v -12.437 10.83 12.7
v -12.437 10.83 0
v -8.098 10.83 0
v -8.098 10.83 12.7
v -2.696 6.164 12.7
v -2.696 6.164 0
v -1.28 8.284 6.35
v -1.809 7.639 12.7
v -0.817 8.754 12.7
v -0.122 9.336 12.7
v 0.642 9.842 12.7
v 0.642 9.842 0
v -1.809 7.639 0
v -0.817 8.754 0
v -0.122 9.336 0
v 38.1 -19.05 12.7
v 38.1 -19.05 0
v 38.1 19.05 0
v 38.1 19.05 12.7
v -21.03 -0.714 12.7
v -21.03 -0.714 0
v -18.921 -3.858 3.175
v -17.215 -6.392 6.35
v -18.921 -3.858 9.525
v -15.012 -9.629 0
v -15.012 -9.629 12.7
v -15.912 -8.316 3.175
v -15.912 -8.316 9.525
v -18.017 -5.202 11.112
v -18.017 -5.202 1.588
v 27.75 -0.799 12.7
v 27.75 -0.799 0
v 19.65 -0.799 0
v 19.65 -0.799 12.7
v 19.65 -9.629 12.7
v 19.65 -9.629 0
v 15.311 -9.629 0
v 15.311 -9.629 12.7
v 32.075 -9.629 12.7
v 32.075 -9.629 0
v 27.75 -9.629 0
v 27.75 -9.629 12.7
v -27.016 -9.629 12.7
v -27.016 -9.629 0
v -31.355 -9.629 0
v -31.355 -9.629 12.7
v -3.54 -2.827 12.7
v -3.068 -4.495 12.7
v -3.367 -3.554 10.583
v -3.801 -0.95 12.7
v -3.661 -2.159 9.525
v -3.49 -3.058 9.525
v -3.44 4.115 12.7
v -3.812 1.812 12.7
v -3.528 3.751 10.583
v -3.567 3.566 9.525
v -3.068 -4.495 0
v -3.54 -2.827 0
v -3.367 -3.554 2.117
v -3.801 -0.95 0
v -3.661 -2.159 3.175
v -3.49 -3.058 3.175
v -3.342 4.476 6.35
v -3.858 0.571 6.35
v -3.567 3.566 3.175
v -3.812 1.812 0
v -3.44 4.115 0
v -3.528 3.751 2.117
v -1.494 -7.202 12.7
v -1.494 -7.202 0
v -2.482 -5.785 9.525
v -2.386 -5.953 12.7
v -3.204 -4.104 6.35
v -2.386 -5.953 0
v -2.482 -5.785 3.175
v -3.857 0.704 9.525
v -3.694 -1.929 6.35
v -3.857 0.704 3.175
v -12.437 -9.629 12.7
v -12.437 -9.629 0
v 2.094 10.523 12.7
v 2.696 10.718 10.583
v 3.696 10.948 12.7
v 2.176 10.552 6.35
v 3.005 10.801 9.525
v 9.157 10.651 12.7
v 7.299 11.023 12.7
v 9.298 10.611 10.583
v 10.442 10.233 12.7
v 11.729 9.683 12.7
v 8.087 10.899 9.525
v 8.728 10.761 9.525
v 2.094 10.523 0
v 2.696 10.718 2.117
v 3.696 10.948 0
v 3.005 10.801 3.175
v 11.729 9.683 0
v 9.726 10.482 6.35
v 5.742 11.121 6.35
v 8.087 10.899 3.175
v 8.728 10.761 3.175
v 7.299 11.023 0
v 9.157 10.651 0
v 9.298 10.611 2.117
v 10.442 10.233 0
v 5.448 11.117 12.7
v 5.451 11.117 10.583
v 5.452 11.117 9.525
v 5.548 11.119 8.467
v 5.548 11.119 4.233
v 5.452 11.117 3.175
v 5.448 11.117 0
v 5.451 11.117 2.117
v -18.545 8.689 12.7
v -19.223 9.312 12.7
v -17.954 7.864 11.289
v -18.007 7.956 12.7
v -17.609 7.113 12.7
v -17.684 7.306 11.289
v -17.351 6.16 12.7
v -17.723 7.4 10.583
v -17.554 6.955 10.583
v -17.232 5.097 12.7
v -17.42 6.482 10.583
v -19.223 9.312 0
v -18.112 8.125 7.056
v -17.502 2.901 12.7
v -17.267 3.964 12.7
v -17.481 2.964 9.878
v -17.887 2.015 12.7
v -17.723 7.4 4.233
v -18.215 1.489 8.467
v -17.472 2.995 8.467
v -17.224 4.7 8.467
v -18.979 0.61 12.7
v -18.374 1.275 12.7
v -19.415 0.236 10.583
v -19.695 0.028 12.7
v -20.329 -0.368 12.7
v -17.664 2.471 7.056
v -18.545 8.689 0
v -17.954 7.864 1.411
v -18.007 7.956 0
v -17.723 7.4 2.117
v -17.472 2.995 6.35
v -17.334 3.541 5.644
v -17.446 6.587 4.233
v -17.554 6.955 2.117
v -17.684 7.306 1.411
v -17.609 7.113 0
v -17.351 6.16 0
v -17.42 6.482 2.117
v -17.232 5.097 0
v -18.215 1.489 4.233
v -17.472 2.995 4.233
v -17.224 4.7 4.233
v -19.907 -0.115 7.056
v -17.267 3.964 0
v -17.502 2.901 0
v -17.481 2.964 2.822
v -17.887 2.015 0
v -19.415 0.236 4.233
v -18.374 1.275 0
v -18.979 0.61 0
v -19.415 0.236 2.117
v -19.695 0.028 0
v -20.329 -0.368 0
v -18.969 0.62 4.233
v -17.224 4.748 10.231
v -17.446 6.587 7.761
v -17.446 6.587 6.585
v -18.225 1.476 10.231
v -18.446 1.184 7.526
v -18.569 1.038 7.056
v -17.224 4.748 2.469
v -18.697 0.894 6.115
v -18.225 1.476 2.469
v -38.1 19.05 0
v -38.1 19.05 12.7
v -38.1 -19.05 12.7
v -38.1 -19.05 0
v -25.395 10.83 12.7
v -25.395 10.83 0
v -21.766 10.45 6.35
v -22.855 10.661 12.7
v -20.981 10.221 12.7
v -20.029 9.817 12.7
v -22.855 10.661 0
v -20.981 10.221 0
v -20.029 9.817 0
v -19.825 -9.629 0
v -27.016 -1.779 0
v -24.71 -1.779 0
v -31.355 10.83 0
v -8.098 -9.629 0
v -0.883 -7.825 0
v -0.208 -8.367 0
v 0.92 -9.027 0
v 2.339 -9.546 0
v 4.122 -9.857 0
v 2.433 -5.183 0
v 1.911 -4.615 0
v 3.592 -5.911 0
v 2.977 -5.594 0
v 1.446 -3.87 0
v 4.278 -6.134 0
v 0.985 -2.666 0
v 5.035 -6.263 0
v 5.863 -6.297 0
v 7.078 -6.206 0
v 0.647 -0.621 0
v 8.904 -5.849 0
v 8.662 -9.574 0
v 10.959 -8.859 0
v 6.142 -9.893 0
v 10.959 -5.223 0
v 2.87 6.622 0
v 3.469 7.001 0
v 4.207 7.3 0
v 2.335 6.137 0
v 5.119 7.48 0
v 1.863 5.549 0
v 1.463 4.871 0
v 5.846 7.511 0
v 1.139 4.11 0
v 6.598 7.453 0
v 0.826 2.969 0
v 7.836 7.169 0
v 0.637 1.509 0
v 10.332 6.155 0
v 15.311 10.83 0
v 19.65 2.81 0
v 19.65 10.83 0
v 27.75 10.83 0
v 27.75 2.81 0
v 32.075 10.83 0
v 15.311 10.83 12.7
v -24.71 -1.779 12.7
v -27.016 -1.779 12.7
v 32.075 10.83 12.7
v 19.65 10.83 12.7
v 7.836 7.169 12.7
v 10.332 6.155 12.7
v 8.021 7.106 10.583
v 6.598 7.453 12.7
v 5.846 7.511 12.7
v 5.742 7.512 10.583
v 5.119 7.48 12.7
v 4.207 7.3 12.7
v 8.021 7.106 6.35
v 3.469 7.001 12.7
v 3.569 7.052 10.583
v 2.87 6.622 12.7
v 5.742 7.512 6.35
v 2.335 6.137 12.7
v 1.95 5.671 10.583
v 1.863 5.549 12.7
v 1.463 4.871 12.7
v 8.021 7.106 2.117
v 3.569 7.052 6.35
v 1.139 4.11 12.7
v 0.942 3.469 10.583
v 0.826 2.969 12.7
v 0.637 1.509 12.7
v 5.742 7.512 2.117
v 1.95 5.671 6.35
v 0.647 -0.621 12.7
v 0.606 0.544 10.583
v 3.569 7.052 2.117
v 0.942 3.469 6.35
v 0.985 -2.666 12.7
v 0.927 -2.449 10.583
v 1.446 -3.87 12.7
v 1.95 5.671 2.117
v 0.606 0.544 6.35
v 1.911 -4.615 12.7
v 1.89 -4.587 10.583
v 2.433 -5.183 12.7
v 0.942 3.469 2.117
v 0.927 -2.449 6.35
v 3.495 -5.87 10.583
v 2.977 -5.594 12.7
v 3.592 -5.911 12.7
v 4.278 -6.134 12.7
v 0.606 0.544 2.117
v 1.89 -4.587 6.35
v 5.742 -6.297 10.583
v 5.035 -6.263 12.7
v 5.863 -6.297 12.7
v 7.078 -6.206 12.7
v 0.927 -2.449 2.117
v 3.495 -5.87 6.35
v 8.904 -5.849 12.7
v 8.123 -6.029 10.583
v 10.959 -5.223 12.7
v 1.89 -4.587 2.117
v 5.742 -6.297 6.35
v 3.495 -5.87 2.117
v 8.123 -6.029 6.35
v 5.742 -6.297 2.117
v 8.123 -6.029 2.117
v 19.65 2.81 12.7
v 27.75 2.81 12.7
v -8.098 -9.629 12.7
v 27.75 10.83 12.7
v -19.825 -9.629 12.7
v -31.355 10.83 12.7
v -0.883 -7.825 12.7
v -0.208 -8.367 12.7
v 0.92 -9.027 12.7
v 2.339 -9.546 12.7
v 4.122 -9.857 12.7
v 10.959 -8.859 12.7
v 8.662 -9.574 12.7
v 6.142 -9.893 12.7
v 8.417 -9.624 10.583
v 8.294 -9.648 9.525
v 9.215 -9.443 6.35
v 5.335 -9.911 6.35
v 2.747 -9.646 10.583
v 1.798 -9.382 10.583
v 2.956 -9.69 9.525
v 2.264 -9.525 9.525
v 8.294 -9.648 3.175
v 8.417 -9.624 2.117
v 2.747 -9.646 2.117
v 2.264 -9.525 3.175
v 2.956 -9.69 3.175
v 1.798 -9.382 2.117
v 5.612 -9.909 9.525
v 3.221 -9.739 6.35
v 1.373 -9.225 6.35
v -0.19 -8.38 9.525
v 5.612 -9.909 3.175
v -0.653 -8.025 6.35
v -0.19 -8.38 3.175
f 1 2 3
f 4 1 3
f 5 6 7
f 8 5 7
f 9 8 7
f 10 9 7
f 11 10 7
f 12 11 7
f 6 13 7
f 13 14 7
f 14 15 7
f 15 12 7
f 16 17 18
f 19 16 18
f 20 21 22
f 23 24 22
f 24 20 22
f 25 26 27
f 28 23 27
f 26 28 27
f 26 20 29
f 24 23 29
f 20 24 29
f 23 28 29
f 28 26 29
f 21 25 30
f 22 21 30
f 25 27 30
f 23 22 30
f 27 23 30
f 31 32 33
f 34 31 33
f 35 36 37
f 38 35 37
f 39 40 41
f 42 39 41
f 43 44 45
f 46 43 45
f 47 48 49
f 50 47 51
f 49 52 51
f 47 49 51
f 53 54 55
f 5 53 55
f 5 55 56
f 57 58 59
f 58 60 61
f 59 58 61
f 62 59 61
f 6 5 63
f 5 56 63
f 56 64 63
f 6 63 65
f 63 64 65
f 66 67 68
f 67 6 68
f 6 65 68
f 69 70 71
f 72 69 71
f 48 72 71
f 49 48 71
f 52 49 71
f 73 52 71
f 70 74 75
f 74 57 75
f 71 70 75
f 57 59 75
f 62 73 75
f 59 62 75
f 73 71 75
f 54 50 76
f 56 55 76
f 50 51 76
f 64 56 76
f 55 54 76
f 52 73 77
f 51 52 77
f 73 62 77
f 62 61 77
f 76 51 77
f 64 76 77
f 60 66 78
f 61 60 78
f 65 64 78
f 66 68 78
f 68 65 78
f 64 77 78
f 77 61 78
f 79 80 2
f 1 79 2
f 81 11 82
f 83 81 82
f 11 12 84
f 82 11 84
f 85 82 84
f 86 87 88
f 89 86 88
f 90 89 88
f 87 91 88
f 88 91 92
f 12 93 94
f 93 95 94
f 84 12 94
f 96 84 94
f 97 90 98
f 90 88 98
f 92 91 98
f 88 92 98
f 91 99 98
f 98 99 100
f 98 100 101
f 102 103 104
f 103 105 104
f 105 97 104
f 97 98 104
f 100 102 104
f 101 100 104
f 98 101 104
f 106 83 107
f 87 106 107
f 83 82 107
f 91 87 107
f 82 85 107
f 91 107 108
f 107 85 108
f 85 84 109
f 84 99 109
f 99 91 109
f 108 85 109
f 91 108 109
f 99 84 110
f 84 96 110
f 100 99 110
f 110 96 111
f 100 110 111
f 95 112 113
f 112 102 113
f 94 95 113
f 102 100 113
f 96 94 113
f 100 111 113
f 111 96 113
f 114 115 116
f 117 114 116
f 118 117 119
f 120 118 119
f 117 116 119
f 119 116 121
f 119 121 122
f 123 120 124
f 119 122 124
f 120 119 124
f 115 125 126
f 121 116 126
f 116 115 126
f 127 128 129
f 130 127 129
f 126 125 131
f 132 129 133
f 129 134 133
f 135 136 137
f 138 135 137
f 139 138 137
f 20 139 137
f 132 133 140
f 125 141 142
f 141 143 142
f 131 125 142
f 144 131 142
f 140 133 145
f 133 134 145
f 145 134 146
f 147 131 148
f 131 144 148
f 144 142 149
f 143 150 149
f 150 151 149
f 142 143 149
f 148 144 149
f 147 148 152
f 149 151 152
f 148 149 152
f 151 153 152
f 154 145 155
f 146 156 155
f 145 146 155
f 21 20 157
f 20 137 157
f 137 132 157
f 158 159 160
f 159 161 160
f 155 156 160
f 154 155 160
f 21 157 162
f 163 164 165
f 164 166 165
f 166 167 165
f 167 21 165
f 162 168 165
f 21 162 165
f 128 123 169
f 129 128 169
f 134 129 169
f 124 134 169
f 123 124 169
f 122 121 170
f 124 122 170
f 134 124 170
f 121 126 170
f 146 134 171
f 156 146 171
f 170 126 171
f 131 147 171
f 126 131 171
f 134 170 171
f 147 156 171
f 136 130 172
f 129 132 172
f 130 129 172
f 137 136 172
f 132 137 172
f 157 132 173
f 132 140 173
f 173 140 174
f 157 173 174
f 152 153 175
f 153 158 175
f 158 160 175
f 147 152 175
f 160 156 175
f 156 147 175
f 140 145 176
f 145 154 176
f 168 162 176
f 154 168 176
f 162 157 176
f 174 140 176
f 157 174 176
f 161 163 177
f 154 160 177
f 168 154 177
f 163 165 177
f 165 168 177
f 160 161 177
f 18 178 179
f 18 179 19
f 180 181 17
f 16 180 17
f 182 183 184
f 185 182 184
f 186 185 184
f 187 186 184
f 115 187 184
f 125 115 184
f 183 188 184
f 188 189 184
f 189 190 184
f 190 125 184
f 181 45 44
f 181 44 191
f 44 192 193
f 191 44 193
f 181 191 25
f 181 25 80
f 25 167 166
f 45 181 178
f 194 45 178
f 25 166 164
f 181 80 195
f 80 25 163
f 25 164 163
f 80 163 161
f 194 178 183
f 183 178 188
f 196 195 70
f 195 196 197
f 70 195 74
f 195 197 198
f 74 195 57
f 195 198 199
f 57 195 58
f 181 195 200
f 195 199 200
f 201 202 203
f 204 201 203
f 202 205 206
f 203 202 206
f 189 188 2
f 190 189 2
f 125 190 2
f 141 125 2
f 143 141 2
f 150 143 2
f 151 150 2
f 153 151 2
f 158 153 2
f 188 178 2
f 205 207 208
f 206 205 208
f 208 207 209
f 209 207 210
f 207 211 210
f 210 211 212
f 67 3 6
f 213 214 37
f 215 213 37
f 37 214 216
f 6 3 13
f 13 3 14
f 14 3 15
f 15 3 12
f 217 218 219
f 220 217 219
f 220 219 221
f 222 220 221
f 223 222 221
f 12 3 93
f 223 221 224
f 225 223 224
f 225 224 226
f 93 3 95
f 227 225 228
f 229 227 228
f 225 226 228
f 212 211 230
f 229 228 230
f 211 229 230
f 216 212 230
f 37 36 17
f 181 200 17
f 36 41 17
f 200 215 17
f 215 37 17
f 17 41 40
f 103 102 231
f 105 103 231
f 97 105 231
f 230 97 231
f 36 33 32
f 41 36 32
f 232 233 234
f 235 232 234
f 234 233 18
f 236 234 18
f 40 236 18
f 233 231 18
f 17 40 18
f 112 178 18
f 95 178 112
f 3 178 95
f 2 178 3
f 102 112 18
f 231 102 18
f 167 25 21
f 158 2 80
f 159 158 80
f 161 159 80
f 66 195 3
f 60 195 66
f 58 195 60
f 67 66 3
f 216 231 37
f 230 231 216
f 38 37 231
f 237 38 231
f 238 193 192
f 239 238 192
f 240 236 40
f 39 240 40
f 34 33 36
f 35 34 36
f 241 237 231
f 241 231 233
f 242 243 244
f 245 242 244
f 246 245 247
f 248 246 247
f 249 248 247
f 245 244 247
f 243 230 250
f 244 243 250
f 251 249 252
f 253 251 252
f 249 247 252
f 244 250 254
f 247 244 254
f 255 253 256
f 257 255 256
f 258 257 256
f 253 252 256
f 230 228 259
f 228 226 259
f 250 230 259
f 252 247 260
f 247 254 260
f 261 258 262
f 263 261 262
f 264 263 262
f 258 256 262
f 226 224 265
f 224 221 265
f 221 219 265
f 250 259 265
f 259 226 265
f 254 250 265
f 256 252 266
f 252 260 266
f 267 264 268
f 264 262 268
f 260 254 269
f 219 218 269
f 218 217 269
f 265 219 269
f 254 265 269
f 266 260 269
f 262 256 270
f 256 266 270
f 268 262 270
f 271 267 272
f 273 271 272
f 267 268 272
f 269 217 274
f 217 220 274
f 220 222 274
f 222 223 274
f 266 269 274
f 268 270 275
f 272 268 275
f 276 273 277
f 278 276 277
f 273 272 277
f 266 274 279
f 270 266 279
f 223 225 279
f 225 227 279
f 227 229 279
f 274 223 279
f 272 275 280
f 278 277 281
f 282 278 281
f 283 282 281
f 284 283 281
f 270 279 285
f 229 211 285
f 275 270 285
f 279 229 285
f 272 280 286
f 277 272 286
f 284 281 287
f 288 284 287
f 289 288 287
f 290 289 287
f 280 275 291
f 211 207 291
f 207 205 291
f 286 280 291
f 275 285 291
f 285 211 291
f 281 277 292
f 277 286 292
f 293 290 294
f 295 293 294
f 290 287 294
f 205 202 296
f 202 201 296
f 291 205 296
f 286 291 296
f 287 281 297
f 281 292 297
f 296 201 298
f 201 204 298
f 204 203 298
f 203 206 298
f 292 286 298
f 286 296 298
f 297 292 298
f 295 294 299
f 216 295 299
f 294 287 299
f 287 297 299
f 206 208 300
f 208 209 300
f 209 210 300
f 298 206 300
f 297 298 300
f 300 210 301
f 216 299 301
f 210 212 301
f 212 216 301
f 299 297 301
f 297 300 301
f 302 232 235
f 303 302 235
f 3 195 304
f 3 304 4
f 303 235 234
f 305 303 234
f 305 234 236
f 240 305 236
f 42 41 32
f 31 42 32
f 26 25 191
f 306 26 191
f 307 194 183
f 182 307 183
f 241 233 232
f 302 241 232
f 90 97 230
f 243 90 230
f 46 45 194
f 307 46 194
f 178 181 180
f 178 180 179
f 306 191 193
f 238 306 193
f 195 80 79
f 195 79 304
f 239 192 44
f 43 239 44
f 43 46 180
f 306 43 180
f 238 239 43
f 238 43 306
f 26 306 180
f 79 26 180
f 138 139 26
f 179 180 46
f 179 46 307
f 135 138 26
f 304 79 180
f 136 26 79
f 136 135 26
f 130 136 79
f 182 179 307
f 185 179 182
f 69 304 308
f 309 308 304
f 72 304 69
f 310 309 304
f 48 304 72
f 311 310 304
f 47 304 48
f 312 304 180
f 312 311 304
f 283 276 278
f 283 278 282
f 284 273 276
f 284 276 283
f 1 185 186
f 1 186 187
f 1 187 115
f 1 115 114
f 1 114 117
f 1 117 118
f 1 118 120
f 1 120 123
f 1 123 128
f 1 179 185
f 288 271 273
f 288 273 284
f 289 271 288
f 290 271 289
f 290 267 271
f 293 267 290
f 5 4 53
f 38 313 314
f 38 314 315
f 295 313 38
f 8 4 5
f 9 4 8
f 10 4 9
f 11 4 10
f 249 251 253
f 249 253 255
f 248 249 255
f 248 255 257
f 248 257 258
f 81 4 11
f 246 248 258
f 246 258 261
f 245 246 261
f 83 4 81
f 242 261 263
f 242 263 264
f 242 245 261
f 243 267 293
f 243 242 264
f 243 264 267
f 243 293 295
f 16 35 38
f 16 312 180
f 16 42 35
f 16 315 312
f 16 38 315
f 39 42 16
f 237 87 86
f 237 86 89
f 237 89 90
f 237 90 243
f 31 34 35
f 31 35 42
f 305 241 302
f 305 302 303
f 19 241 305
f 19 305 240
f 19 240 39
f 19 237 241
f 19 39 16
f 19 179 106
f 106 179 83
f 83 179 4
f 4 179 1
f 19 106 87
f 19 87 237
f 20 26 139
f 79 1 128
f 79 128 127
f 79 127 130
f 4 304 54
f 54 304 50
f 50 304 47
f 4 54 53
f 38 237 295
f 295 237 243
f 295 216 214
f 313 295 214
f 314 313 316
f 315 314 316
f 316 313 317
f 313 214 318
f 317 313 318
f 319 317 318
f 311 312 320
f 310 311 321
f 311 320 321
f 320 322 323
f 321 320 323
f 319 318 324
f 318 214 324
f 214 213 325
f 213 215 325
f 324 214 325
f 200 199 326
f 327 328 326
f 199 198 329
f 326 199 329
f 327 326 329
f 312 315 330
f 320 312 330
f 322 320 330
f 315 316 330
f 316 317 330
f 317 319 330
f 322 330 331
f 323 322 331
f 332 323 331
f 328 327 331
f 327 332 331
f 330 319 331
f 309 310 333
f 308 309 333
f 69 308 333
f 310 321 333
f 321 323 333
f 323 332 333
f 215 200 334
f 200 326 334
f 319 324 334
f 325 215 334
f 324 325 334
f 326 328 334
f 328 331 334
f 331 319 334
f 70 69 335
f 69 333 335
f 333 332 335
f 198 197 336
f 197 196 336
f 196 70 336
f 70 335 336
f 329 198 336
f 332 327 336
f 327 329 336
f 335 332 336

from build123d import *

# Parameters (mm, degrees)
F0_W     = 76.2
F0_H     = 38.1
F0_W_2   = 4.3388303002
F0_H_2   = 20.4583236755
F1_DEPTH = 12.7


with BuildPart() as f1:
    # F0 (on Top) → F1 (new body)
    with BuildSketch(Plane.XY):
        Rectangle(F0_W, F0_H)
        with BuildLine():
            Line((-24.7102881895, -1.7794135219), (-27.0162712695, -1.7794135219))
            Line((-27.0162712695, -1.7794135219), (-27.0162712695, -9.6287112683))
            Line((-27.0162712695, -9.6287112683), (-31.3551015697, -9.6287112683))
            Line((-31.3551015697, -9.6287112683), (-31.3551015697, 10.8296124072))
            Line((-31.3551015697, 10.8296124072), (-25.3953666579, 10.8296124072))
            add(Edge.make_bspline(
                [(-25.3953666579, 10.8296124072), (-21.2222089285, 10.8296124072), (-19.2229439863, 9.3116934477)],
                knots=[0, 0, 0, 1, 1, 1], degree=2))
            add(Edge.make_bspline(
                [(-19.2229439863, 9.3116934477), (-17.223679044, 7.7937744882), (-17.223679044, 4.6997272875)],
                knots=[0, 0, 0, 1, 1, 1], degree=2))
            add(Edge.make_bspline(
                [(-17.223679044, 4.6997272875), (-17.223679044, 2.8952395569), (-18.2154756503, 1.4892615236)],
                knots=[0, 0, 0, 1, 1, 1], degree=2))
            add(Edge.make_bspline(
                [(-18.2154756503, 1.4892615236), (-19.2072722566, 0.0832834903), (-21.0296705354, -0.7137359044)],
                knots=[0, 0, 0, 1, 1, 1], degree=2))
            add(Edge.make_bspline(
                [(-21.0296705354, -0.7137359044), (-16.4087491012, -7.6137745964), (-15.011726342, -9.6287112683)],
                knots=[0, 0, 0, 1, 1, 1], degree=2))
            Line((-15.011726342, -9.6287112683), (-19.8251861693, -9.6287112683))
            Line((-19.8251861693, -9.6287112683), (-24.7102881895, -1.7794135219))
        make_face(mode=Mode.SUBTRACT)
        with Locations((-10.2676698889, 0.6004505694)):
            Rectangle(F0_W_2, F0_H_2, mode=Mode.SUBTRACT)
        with BuildLine():
            add(Edge.make_bspline(
                [(8.0212386365, 7.1064572012), (6.8615306409, 7.5116833541), (5.7421213787, 7.5116833541)],
                knots=[0, 0, 0, 1, 1, 1], degree=2))
            add(Edge.make_bspline(
                [(5.7421213787, 7.5116833541), (3.2928539131, 7.5116833541), (1.9495627985, 5.6713745271)],
                knots=[0, 0, 0, 1, 1, 1], degree=2))
            add(Edge.make_bspline(
                [(1.9495627985, 5.6713745271), (0.6062716839, 3.8310657001), (0.6062716839, 0.5444801063)],
                knots=[0, 0, 0, 1, 1, 1], degree=2))
            add(Edge.make_bspline(
                [(0.6062716839, 0.5444801063), (0.6062716839, -6.2973493041), (5.7421213787, -6.2973493041)],
                knots=[0, 0, 0, 1, 1, 1], degree=2))
            add(Edge.make_bspline(
                [(5.7421213787, -6.2973493041), (7.8958647991, -6.2973493041), (10.9585685404, -5.2227164124)],
                knots=[0, 0, 0, 1, 1, 1], degree=2))
            Line((10.9585685404, -5.2227164124), (10.9585685404, -8.8585576959))
            add(Edge.make_bspline(
                [(10.9585685404, -8.8585576959), (8.4421365191, -9.9108024024), (5.3346564073, -9.9108024024)],
                knots=[0, 0, 0, 1, 1, 1], degree=2))
            add(Edge.make_bspline(
                [(5.3346564073, -9.9108024024), (0.8704522697, -9.9108024024), (-1.493740092, -7.2018319879)],
                knots=[0, 0, 0, 1, 1, 1], degree=2))
            add(Edge.make_bspline(
                [(-1.493740092, -7.2018319879), (-3.8579324537, -4.4928615735), (-3.8579324537, 0.5713459286)],
                knots=[0, 0, 0, 1, 1, 1], degree=2))
            add(Edge.make_bspline(
                [(-3.8579324537, 0.5713459286), (-3.8579324537, 3.7639011443), (-2.6959856395, 6.1639146024)],
                knots=[0, 0, 0, 1, 1, 1], degree=2))
            add(Edge.make_bspline(
                [(-2.6959856395, 6.1639146024), (-1.5340388254, 8.5639280605), (0.6420927803, 9.8422934379)],
                knots=[0, 0, 0, 1, 1, 1], degree=2))
            add(Edge.make_bspline(
                [(0.6420927803, 9.8422934379), (2.8182243859, 11.1206588153), (5.7421213787, 11.1206588153)],
                knots=[0, 0, 0, 1, 1, 1], degree=2))
            add(Edge.make_bspline(
                [(5.7421213787, 11.1206588153), (8.7197500161, 11.1206588153), (11.7287221128, 9.6833373227)],
                knots=[0, 0, 0, 1, 1, 1], degree=2))
            Line((11.7287221128, 9.6833373227), (10.3316993536, 6.1549593283))
            add(Edge.make_bspline(
                [(10.3316993536, 6.1549593283), (9.1809466321, 6.7012310483), (8.0212386365, 7.1064572012)],
                knots=[0, 0, 0, 1, 1, 1], degree=2))
        make_face(mode=Mode.SUBTRACT)
        Polygon((32.0751048621, 10.8296124072), (32.0751048621, -9.6287112683), (27.749707473, -9.6287112683), (27.749707473, -0.7988110083), (19.649662052, -0.7988110083), (19.649662052, -9.6287112683), (15.3108317518, -9.6287112683), (15.3108317518, 10.8296124072), (19.649662052, 10.8296124072), (19.649662052, 2.810164453), (27.749707473, 2.810164453), (27.749707473, 10.8296124072), align=None, mode=Mode.SUBTRACT)
    extrude(amount=F1_DEPTH)


solid = f1.part
